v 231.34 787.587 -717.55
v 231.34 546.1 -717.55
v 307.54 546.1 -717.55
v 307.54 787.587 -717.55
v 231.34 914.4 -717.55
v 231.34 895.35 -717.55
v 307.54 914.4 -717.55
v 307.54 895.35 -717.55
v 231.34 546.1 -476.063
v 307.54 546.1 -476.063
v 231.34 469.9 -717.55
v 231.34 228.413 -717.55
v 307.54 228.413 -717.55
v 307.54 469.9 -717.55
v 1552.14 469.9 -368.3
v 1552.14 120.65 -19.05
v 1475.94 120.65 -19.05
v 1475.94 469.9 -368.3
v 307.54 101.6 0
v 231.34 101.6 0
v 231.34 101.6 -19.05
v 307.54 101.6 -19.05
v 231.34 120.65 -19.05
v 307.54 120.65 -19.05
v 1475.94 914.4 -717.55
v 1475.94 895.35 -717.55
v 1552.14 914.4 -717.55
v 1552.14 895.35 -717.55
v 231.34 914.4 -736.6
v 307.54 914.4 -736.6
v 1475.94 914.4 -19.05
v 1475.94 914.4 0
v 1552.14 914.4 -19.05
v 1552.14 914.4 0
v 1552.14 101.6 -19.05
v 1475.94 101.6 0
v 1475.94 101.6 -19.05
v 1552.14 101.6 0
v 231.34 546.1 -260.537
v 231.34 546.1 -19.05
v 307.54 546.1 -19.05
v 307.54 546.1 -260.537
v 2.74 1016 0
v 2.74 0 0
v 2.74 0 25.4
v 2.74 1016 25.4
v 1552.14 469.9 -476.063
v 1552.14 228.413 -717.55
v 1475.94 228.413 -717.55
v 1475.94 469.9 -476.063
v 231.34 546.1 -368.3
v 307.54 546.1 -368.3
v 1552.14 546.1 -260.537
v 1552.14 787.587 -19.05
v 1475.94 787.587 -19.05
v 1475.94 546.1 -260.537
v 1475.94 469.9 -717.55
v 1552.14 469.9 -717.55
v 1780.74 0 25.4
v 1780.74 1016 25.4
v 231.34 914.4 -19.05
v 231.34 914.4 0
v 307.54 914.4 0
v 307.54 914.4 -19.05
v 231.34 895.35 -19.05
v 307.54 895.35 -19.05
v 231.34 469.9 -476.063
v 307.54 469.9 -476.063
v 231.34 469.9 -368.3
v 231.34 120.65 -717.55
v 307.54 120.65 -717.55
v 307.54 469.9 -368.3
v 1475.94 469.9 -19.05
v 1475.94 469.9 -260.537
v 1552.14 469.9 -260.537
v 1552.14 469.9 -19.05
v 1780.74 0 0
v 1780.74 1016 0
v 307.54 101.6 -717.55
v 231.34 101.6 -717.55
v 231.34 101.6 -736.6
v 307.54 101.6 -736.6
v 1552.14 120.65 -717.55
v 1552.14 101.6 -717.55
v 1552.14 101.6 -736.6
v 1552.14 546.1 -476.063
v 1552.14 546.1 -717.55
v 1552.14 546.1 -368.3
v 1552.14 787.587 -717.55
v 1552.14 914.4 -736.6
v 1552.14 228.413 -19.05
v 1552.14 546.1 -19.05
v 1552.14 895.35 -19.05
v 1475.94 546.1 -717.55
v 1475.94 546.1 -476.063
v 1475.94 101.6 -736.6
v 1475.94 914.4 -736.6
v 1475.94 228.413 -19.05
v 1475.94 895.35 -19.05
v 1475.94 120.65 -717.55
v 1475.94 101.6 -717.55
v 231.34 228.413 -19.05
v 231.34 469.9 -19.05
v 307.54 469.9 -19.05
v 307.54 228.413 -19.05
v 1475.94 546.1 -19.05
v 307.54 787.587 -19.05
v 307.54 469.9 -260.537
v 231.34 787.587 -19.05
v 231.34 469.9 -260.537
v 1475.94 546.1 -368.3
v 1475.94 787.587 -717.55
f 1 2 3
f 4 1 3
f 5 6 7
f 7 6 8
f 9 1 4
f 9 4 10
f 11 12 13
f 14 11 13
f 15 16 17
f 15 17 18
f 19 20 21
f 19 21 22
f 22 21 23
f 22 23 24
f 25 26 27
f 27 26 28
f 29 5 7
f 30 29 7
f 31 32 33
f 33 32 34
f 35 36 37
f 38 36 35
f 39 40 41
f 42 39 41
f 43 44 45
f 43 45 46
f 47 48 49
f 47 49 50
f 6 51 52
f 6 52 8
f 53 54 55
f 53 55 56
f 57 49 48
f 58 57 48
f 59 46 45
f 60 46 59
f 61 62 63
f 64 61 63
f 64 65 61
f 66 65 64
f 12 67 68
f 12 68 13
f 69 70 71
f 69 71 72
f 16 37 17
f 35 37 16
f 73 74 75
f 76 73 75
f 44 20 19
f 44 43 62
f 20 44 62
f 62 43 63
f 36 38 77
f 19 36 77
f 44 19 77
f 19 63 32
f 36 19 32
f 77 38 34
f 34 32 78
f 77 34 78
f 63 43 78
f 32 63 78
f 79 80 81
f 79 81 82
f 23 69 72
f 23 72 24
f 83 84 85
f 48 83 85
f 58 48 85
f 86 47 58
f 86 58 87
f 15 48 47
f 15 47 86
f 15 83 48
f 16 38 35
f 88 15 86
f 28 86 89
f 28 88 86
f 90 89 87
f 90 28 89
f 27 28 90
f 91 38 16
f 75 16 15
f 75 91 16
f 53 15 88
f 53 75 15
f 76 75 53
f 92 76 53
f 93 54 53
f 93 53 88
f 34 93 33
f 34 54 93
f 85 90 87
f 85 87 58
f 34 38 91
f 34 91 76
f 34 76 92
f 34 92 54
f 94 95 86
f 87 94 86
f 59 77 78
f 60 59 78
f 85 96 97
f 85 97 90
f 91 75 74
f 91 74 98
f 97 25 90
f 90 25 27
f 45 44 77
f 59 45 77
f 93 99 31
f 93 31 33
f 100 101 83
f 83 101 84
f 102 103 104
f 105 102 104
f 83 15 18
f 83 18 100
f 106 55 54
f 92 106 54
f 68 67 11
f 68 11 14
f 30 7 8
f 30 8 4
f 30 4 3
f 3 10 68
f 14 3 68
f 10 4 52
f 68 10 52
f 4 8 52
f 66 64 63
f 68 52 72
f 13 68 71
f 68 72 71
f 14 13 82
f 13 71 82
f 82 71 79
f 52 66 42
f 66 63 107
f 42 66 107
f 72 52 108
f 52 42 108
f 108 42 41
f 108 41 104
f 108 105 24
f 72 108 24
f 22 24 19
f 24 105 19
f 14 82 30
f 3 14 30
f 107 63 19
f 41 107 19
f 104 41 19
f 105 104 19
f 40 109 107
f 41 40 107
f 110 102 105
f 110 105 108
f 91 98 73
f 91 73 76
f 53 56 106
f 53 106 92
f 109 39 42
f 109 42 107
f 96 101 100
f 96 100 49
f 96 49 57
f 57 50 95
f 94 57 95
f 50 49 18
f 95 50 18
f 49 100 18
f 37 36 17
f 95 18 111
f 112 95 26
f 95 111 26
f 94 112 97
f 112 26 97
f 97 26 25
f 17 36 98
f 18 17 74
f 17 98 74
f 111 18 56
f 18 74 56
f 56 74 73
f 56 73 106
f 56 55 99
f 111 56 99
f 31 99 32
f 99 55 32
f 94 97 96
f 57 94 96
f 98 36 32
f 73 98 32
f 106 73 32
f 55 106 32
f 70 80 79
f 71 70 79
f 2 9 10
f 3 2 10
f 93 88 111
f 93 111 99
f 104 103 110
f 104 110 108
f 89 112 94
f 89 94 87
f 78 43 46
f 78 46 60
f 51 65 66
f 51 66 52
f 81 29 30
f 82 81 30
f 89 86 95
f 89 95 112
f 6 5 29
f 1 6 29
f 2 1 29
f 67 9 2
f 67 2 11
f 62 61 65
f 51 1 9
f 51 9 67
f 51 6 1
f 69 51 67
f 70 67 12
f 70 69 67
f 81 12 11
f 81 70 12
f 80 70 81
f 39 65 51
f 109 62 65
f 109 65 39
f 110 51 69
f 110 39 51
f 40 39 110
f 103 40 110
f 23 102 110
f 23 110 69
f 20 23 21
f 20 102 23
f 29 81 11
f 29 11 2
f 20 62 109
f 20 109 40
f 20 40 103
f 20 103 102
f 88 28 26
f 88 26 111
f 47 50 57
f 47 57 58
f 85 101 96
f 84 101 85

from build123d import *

# Parameters (mm, degrees)
F0_W      = 1778
F0_H      = 1016
F1_DEPTH  = 25.4
F2_W      = 76.2
F2_H      = 76.2
F3_DEPTH  = 717.55
F4_W      = 76.2
F4_H      = 368.3
F4_H_2    = 76.2
F5_DEPTH  = 19.05
F6_W      = 76.2
F6_H      = 368.3
F7_DEPTH  = 19.05
F9_DEPTH  = 76.2
F11_DEPTH = 76.2


with BuildPart() as f1:
    # F0 (on Top) → F1 (new body)
    with BuildSketch(Plane.XY):
        with Locations((891.739976, 508)):
            Rectangle(F0_W, F0_H)
    extrude(amount=F1_DEPTH)

    # F2 (on face) → F3 (join)
    with BuildSketch(Plane(origin=(0, 0, 0), x_dir=(1, 0, 0), z_dir=(0, 0, -1))):
        with Locations((269.439976, -508)):
            Rectangle(F2_W, F2_H)
        with Locations((1514.039976, -508)):
            Rectangle(F2_W, F2_H)
    extrude(amount=F3_DEPTH)

    # F4 (on face) → F5 (join)
    with BuildSketch(Plane(origin=(0, 0, -717.55), x_dir=(1, 0, 0), z_dir=(0, 0, -1))):
        with Locations((269.439976, -285.75)):
            Rectangle(F4_W, F4_H)
        with Locations((269.439976, -508)):
            Rectangle(F4_W, F4_H_2)
        with Locations((269.439976, -730.25)):
            Rectangle(F4_W, F4_H)
        with Locations((1514.039976, -285.75)):
            Rectangle(F4_W, F4_H)
        with Locations((1514.039976, -508)):
            Rectangle(F4_W, F4_H_2)
        with Locations((1514.039976, -730.25)):
            Rectangle(F4_W, F4_H)
    extrude(amount=F5_DEPTH)

    # F6 (on face) → F7 (join)
    with BuildSketch(Plane(origin=(0, 0, 0), x_dir=(1, 0, 0), z_dir=(0, 0, -1))):
        with Locations((1514.039976, -730.25)):
            Rectangle(F6_W, F6_H)
        with Locations((1514.039976, -285.75)):
            Rectangle(F6_W, F6_H)
        with Locations((269.439976, -730.25)):
            Rectangle(F6_W, F6_H)
        with Locations((269.439976, -285.75)):
            Rectangle(F6_W, F6_H)
    extrude(amount=F7_DEPTH)

    # F8 (on face) → F9 (join)
    with BuildSketch(Plane(origin=(231.339976, 0, 0), x_dir=(0, -1, 0), z_dir=(-1, 0, 0))):
        Polygon((-895.35, -19.05), (-546.1, -368.3), (-546.1, -260.536927), (-787.586927, -19.05), align=None)
        Polygon((-469.9, -368.3), (-120.65, -19.05), (-228.413073, -19.05), (-469.9, -260.536927), align=None)
        Polygon((-228.413073, -717.55), (-120.65, -717.55), (-469.9, -368.3), (-469.9, -476.063073), align=None)
        Polygon((-546.1, -476.063073), (-546.1, -368.3), (-895.35, -717.55), (-787.586927, -717.55), align=None)
    extrude(amount=-F9_DEPTH)

    # F10 (on face) → F11 (join)
    with BuildSketch(Plane.YZ.offset(1552.139976)):
        Polygon((120.65, -19.05), (469.9, -368.3), (469.9, -260.536927), (228.413073, -19.05), align=None)
        Polygon((546.1, -368.3), (895.35, -19.05), (787.586927, -19.05), (546.1, -260.536927), align=None)
        Polygon((787.586927, -717.55), (895.35, -717.55), (546.1, -368.3), (546.1, -476.063073), align=None)
        Polygon((469.9, -476.063073), (469.9, -368.3), (120.65, -717.55), (228.413073, -717.55), align=None)
    extrude(amount=-F11_DEPTH)


solid = f1.part
